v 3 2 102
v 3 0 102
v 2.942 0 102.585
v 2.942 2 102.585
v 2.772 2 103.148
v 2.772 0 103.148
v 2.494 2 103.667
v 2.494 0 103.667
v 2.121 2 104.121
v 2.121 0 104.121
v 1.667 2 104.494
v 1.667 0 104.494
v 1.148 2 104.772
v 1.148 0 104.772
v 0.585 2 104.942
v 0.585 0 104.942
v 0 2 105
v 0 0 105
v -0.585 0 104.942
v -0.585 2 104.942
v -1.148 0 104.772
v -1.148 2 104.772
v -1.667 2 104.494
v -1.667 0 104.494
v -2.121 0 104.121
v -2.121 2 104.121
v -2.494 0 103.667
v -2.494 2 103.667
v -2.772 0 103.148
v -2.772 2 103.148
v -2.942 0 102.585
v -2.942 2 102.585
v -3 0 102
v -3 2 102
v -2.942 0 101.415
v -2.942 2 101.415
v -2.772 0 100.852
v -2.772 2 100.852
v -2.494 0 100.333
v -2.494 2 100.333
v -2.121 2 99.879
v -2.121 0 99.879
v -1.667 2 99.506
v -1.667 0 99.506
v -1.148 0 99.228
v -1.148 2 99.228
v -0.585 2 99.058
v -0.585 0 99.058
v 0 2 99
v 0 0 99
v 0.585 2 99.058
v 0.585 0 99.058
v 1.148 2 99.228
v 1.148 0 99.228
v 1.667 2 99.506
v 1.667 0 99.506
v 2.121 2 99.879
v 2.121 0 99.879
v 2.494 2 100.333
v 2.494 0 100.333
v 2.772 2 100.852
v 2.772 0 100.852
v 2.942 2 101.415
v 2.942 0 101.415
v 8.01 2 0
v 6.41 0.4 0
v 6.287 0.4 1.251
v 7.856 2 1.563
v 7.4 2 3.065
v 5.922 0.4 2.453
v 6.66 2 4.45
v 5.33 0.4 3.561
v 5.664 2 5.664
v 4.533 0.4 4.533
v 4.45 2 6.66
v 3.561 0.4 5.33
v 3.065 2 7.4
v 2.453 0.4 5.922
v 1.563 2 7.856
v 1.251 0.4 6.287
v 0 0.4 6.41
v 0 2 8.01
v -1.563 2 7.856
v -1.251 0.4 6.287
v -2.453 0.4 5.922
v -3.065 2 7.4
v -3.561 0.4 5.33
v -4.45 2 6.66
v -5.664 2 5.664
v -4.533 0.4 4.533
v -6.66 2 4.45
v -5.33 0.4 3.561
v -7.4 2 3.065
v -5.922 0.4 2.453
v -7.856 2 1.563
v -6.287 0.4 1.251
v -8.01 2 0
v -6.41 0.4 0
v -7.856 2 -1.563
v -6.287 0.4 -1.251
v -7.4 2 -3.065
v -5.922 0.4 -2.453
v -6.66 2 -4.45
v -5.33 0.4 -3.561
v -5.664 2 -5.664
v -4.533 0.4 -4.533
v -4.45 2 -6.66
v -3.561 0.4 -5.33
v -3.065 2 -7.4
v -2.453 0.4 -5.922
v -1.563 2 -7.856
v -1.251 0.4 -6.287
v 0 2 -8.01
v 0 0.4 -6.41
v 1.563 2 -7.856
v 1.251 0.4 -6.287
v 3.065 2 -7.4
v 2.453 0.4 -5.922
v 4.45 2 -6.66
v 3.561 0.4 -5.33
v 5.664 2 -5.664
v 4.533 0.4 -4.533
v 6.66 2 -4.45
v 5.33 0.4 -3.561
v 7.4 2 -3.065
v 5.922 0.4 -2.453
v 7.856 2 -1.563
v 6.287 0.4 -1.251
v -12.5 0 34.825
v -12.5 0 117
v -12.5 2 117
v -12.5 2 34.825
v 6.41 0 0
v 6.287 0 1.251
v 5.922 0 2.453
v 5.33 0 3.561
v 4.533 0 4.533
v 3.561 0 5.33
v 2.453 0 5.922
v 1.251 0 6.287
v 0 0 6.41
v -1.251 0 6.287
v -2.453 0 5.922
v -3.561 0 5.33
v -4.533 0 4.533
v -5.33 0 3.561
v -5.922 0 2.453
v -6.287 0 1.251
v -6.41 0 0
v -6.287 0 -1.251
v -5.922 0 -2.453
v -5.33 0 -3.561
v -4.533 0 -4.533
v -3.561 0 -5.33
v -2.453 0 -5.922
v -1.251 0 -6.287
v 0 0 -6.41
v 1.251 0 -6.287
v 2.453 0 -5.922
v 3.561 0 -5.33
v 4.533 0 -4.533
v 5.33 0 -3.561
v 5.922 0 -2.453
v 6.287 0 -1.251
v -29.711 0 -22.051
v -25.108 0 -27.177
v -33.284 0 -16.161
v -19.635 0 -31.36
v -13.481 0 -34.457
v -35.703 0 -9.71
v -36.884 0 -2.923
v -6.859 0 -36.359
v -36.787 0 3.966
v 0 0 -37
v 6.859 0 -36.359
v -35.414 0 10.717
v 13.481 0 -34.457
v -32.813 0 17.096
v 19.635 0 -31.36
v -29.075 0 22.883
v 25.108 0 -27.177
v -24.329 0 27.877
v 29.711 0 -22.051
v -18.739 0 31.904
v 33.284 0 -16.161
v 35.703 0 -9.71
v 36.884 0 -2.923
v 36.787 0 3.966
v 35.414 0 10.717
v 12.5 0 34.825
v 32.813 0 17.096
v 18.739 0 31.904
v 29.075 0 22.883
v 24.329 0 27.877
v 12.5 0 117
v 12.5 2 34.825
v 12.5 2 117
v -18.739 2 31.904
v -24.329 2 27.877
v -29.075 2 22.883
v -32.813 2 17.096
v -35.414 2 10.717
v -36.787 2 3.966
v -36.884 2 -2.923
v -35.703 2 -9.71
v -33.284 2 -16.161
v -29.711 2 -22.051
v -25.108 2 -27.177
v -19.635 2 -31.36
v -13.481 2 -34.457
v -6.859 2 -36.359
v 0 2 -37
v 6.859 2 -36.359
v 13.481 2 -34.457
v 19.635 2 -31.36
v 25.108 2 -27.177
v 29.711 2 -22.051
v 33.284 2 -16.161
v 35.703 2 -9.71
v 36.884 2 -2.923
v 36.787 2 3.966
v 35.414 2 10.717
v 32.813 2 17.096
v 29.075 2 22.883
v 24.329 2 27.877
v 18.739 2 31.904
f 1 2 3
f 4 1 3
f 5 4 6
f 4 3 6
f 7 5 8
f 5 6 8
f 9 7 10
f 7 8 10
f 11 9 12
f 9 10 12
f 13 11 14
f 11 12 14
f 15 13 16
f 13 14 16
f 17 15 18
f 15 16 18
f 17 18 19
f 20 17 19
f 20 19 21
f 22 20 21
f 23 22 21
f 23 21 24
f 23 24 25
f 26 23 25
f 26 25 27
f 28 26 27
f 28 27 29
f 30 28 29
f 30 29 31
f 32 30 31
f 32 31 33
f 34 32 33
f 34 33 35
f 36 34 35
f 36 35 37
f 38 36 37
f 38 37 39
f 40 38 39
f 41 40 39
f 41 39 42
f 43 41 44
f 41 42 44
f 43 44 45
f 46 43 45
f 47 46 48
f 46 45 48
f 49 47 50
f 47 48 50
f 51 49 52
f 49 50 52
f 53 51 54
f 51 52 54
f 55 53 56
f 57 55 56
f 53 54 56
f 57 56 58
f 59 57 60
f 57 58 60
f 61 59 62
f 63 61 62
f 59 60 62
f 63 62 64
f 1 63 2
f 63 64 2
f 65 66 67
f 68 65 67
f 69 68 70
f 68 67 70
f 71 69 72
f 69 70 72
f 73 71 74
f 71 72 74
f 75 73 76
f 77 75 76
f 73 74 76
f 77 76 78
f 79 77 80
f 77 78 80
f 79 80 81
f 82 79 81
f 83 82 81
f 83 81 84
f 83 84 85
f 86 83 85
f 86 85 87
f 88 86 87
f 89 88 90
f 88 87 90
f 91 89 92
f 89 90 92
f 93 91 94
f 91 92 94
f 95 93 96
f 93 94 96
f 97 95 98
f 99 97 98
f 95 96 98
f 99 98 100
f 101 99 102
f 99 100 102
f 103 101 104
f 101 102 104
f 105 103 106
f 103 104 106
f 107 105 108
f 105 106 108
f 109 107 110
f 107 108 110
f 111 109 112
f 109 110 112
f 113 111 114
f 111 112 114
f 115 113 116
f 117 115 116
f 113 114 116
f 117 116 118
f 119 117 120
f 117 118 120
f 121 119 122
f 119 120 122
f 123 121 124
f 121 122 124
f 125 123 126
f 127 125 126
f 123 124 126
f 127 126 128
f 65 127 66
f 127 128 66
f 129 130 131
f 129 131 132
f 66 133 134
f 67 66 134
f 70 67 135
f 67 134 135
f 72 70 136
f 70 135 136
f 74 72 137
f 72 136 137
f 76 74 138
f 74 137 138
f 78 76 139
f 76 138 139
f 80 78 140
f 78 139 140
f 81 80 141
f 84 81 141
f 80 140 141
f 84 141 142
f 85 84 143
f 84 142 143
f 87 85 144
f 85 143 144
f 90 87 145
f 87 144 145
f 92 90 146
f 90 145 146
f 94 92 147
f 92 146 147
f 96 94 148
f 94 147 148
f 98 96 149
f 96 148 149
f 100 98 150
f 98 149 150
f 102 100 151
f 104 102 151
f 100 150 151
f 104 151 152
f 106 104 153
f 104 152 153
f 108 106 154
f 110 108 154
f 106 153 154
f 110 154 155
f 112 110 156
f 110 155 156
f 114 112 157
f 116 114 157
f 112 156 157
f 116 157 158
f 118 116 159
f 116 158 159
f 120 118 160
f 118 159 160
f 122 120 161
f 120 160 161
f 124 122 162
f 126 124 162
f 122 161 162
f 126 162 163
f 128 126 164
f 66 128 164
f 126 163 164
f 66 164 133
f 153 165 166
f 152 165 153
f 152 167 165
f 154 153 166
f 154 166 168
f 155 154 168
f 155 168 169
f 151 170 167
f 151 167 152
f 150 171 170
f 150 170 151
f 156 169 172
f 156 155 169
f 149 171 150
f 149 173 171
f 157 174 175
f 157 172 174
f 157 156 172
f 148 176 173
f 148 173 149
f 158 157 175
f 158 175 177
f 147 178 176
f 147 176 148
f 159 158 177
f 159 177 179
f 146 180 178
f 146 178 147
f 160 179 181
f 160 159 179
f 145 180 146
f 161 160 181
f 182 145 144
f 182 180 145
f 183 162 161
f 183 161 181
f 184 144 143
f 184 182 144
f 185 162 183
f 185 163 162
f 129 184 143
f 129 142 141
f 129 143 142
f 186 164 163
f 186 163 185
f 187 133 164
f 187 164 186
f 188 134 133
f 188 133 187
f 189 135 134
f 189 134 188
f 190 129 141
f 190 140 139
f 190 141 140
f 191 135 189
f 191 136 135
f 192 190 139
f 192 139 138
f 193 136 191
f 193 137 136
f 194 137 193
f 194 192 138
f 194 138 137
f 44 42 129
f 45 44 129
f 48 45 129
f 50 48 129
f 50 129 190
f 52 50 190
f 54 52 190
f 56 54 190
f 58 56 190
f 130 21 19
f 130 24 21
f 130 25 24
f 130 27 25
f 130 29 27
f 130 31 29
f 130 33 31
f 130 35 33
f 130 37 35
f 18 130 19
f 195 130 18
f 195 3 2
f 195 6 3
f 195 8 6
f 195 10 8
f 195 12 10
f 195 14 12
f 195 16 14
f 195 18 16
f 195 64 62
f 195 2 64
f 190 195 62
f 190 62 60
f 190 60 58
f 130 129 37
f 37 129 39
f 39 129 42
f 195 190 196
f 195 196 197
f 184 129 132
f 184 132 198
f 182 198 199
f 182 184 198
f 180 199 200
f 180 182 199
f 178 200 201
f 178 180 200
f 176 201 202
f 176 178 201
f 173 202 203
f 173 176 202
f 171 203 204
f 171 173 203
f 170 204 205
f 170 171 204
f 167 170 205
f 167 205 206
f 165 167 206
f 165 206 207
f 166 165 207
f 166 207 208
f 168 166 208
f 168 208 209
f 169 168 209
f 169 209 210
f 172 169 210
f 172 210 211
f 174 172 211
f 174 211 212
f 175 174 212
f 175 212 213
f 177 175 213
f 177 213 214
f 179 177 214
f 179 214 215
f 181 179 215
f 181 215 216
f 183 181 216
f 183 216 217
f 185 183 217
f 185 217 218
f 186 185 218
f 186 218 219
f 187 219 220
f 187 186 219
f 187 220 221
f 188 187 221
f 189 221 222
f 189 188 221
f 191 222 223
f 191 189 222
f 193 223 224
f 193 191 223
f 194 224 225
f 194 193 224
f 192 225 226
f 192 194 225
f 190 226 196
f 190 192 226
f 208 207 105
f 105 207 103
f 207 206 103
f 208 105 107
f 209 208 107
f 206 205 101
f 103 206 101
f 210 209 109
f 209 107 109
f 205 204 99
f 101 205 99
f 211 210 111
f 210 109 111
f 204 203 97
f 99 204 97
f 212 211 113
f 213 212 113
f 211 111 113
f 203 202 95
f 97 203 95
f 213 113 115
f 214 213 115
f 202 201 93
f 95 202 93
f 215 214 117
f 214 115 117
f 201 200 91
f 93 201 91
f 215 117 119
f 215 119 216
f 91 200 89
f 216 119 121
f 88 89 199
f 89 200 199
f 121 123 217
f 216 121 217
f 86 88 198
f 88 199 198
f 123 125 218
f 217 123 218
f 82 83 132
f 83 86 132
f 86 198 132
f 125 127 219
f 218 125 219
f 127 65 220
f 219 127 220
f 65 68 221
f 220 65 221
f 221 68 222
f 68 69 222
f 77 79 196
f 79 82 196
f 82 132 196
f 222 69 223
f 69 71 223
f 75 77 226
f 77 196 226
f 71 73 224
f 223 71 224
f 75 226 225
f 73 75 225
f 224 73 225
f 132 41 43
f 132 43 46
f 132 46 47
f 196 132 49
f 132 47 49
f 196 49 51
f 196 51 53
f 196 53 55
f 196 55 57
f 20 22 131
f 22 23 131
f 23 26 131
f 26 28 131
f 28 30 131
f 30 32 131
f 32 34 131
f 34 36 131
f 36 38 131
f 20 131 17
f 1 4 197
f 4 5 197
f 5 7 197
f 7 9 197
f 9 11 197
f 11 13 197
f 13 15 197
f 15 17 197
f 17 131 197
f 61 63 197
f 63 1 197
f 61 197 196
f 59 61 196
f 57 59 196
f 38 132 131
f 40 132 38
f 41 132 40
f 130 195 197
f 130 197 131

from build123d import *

# Parameters (mm, degrees)
F0_R     = 37
F0_R_2   = 6.41
F1_DEPTH = 2
F3_DEPTH = 2
F4_R     = 3
F5_DEPTH = 2.001
F6_SIZE2 = 1.6
F6_SIZE  = 1.6


with BuildPart() as f1:
    # F0 (on Front) → F1 (new body)
    with BuildSketch(Plane.XZ):
        Circle(F0_R)
        Circle(F0_R_2, mode=Mode.SUBTRACT)
    extrude(amount=-F1_DEPTH)

    # F2 (on face) → F3 (join)
    with BuildSketch(Plane.XZ):
        with BuildLine():
            Line((12.5, 117), (-12.5, 117))
            Line((-12.5, 117), (-12.5, 34.82456))
            ThreePointArc((-12.5, 34.82456), (0, 37), (12.5, 34.82456))
            Line((12.5, 34.82456), (12.5, 117))
        make_face()
    extrude(amount=-F3_DEPTH)

    # F4 (on face) → F5 (cut, through all)
    with BuildSketch(Plane.XZ):
        with Locations((0, 102)):
            Circle(F4_R)
    extrude(amount=-F5_DEPTH, mode=Mode.SUBTRACT)

    # F6
    f6_edges = [f1.edges().sort_by_distance(p)[0] for p in [
        (-6.41, 2, 0),
    ]]
    chamfer(f6_edges, length=F6_SIZE, length2=F6_SIZE2)


solid = f1.part
